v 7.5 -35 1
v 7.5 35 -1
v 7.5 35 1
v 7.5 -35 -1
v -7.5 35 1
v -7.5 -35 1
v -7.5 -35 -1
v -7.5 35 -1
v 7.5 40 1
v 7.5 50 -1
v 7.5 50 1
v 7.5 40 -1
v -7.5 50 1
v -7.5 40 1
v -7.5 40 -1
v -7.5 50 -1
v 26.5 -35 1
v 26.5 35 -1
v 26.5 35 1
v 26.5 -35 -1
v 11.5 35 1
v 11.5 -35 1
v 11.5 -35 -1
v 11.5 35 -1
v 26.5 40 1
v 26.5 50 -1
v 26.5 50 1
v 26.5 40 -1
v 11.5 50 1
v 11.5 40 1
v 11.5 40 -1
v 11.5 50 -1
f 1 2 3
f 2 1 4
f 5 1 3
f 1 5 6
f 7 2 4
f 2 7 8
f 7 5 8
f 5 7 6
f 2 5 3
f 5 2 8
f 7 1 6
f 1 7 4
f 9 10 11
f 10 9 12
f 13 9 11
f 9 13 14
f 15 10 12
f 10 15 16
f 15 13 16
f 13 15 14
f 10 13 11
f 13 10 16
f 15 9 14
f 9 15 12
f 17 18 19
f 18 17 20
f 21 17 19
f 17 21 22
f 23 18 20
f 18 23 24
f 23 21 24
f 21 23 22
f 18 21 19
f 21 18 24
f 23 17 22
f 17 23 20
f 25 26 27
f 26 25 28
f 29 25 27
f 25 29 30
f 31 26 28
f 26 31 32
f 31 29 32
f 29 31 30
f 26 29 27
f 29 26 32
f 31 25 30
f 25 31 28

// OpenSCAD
// file: shapes.scad
/*
 *  OpenSCAD Shapes Library (www.openscad.at)
 *  Copyright (C) 2009  Catarina Mota <clifford@clifford.at>
 *
 *  This program is free software; you can redistribute it and/or modify
 *  it under the terms of the GNU General Public License as published by
 *  the Free Software Foundation; either version 2 of the License, or
 *  (at your option) any later version.
 *
 *  This program is distributed in the hope that it will be useful,
 *  but WITHOUT ANY WARRANTY; without even the implied warranty of
 *  MERCHANTABILITY or FITNESS FOR A PARTICULAR PURPOSE.  See the
 *  GNU General Public License for more details.
 *
 *  You should have received a copy of the GNU General Public License
 *  along with this program; if not, write to the Free Software
 *  Foundation, Inc., 59 Temple Place, Suite 330, Boston, MA  02111-1307  USA
 *
*/


//box(width, height, depth);
//roundedBox(width, height, depth, factor);
//cone(height, radius);
//oval(width, height, depth);
//tube(height, radius, wall);
//ovalTube(width, height, depth, wall);
//hexagon(height, depth);
//octagon(height, depth);
//dodecagon(height, depth);
//hexagram(height, depth);
//rightTriangle(adjacent, opposite, depth);
//equiTriangle(side, depth);
//12ptStar(height, depth);

//----------------------

//roundedBox(120, 60, 3, 8);

//----------------------

module box(w,h,d) {
	scale ([w,h,d]) cube(1, true);
}

module roundedBox(w,h,d,f){
	difference(){
		box(w,h,d);
		translate([-w/2,h/2,0]) cube(w/(f/2),true);
		translate([w/2,h/2,0]) cube(w/(f/2),true);
		translate([-w/2,-h/2,0]) cube(w/(f/2),true);
		translate([w/2,-h/2,0]) cube(w/(f/2),true);
	}
	translate([-w/2+w/f,h/2-w/f,-d/2]) cylinder(d,w/f, w/f);
	translate([w/2-w/f,h/2-w/f,-d/2]) cylinder(d,w/f, w/f);
	translate([-w/2+w/f,-h/2+w/f,-d/2]) cylinder(d,w/f, w/f);
	translate([w/2-w/f,-h/2+w/f,-d/2]) cylinder(d,w/f, w/f);
}

module cone(height, radius) {
		cylinder(height, radius, 0);
}

module oval(w,h,d) {
	scale ([w/100, h/100, 1]) cylinder(d, 50, 50);
}

module tube(height, radius, wall) {
	difference(){
		cylinder(height, radius, radius);
		cylinder(height, radius-wall, radius-wall);
	}
}

module ovalTube(w,h,d,wall) {
	difference(){
		scale ([w/100, h/100, 1]) cylinder(d, 50, 50);
		scale ([w/100, h/100, 1]) cylinder(d, 50-wall, 50-wall);
	}
}

module hexagon(height, depth) {
	boxWidth=height/1.75;
		union(){
			box(boxWidth, height, depth);
			rotate([0,0,60]) box(boxWidth, height, depth);
			rotate([0,0,-60]) box(boxWidth, height, depth);
		}
}

module octagon(height, depth) {
	intersection(){
		box(height, height, depth);
		rotate([0,0,45]) box(height, height, depth);
	}
}

module dodecagon(height, depth) {
	intersection(){
		hexagon(height, depth);
		rotate([0,0,90]) hexagon(height, depth);
	}
}

module hexagram(height, depth) {
	boxWidth=height/1.75;
	intersection(){
		box(height, boxWidth, depth);
		rotate([0,0,60]) box(height, boxWidth, depth);
	}
	intersection(){
		box(height, boxWidth, depth);
		rotate([0,0,-60]) box(height, boxWidth, depth);
	}
	intersection(){
		rotate([0,0,60]) box(height, boxWidth, depth);
		rotate([0,0,-60]) box(height, boxWidth, depth);
	}
}

module rightTriangle(adjacent, opposite, depth) {
	difference(){
		translate([-adjacent/2,opposite/2,0]) box(adjacent, opposite, depth);
		translate([-adjacent,0,0]){
			rotate([0,0,atan(opposite/adjacent)]) dislocateBox(adjacent*4, opposite, depth);
		}
	}
}

module equiTriangle(side, depth) {
	difference(){
		translate([-side/2,side/2,0]) box(side, side, depth);
		rotate([0,0,30]) dislocateBox(side*2, side, depth);
		translate([-side,0,0]){
			rotate([0,0,60]) dislocateBox(side*2, side, depth);
		}
	}
}

module 12ptStar(height, depth) {
	starNum=3;
	starAngle=360/starNum;
	for (s=[1:starNum]){
		rotate([0, 0, s*starAngle]) box(height, height, depth);
	}
}

//-----------------------
//MOVES THE ROTATION AXIS OF A BOX FROM ITS CENTER TO THE BOTTOM LEFT CORNER
module dislocateBox(w,h,d){
	translate([w/2,h,0]){
		difference(){
			box(w, h*2, d+1);
			translate([-w,0,0]) box(w, h*2, d+1);
		}
	}
}
// main file
include <shapes.scad>  // using Catarina Mota's shapes library

screwsize=4;
length=70;
width=15;
middle=5;
height=2;
triangle_base=20;
triangle_height=10;
triangle_offset=16;
connector_width=6;
connector_height=4;
connector_length = 10;
set();
translate ([width+4,0,0]) set();

module set()
{
//base
box(width, length, height);

translate ([0,length/2+connector_length,0]) box(width, connector_length, height);
}
